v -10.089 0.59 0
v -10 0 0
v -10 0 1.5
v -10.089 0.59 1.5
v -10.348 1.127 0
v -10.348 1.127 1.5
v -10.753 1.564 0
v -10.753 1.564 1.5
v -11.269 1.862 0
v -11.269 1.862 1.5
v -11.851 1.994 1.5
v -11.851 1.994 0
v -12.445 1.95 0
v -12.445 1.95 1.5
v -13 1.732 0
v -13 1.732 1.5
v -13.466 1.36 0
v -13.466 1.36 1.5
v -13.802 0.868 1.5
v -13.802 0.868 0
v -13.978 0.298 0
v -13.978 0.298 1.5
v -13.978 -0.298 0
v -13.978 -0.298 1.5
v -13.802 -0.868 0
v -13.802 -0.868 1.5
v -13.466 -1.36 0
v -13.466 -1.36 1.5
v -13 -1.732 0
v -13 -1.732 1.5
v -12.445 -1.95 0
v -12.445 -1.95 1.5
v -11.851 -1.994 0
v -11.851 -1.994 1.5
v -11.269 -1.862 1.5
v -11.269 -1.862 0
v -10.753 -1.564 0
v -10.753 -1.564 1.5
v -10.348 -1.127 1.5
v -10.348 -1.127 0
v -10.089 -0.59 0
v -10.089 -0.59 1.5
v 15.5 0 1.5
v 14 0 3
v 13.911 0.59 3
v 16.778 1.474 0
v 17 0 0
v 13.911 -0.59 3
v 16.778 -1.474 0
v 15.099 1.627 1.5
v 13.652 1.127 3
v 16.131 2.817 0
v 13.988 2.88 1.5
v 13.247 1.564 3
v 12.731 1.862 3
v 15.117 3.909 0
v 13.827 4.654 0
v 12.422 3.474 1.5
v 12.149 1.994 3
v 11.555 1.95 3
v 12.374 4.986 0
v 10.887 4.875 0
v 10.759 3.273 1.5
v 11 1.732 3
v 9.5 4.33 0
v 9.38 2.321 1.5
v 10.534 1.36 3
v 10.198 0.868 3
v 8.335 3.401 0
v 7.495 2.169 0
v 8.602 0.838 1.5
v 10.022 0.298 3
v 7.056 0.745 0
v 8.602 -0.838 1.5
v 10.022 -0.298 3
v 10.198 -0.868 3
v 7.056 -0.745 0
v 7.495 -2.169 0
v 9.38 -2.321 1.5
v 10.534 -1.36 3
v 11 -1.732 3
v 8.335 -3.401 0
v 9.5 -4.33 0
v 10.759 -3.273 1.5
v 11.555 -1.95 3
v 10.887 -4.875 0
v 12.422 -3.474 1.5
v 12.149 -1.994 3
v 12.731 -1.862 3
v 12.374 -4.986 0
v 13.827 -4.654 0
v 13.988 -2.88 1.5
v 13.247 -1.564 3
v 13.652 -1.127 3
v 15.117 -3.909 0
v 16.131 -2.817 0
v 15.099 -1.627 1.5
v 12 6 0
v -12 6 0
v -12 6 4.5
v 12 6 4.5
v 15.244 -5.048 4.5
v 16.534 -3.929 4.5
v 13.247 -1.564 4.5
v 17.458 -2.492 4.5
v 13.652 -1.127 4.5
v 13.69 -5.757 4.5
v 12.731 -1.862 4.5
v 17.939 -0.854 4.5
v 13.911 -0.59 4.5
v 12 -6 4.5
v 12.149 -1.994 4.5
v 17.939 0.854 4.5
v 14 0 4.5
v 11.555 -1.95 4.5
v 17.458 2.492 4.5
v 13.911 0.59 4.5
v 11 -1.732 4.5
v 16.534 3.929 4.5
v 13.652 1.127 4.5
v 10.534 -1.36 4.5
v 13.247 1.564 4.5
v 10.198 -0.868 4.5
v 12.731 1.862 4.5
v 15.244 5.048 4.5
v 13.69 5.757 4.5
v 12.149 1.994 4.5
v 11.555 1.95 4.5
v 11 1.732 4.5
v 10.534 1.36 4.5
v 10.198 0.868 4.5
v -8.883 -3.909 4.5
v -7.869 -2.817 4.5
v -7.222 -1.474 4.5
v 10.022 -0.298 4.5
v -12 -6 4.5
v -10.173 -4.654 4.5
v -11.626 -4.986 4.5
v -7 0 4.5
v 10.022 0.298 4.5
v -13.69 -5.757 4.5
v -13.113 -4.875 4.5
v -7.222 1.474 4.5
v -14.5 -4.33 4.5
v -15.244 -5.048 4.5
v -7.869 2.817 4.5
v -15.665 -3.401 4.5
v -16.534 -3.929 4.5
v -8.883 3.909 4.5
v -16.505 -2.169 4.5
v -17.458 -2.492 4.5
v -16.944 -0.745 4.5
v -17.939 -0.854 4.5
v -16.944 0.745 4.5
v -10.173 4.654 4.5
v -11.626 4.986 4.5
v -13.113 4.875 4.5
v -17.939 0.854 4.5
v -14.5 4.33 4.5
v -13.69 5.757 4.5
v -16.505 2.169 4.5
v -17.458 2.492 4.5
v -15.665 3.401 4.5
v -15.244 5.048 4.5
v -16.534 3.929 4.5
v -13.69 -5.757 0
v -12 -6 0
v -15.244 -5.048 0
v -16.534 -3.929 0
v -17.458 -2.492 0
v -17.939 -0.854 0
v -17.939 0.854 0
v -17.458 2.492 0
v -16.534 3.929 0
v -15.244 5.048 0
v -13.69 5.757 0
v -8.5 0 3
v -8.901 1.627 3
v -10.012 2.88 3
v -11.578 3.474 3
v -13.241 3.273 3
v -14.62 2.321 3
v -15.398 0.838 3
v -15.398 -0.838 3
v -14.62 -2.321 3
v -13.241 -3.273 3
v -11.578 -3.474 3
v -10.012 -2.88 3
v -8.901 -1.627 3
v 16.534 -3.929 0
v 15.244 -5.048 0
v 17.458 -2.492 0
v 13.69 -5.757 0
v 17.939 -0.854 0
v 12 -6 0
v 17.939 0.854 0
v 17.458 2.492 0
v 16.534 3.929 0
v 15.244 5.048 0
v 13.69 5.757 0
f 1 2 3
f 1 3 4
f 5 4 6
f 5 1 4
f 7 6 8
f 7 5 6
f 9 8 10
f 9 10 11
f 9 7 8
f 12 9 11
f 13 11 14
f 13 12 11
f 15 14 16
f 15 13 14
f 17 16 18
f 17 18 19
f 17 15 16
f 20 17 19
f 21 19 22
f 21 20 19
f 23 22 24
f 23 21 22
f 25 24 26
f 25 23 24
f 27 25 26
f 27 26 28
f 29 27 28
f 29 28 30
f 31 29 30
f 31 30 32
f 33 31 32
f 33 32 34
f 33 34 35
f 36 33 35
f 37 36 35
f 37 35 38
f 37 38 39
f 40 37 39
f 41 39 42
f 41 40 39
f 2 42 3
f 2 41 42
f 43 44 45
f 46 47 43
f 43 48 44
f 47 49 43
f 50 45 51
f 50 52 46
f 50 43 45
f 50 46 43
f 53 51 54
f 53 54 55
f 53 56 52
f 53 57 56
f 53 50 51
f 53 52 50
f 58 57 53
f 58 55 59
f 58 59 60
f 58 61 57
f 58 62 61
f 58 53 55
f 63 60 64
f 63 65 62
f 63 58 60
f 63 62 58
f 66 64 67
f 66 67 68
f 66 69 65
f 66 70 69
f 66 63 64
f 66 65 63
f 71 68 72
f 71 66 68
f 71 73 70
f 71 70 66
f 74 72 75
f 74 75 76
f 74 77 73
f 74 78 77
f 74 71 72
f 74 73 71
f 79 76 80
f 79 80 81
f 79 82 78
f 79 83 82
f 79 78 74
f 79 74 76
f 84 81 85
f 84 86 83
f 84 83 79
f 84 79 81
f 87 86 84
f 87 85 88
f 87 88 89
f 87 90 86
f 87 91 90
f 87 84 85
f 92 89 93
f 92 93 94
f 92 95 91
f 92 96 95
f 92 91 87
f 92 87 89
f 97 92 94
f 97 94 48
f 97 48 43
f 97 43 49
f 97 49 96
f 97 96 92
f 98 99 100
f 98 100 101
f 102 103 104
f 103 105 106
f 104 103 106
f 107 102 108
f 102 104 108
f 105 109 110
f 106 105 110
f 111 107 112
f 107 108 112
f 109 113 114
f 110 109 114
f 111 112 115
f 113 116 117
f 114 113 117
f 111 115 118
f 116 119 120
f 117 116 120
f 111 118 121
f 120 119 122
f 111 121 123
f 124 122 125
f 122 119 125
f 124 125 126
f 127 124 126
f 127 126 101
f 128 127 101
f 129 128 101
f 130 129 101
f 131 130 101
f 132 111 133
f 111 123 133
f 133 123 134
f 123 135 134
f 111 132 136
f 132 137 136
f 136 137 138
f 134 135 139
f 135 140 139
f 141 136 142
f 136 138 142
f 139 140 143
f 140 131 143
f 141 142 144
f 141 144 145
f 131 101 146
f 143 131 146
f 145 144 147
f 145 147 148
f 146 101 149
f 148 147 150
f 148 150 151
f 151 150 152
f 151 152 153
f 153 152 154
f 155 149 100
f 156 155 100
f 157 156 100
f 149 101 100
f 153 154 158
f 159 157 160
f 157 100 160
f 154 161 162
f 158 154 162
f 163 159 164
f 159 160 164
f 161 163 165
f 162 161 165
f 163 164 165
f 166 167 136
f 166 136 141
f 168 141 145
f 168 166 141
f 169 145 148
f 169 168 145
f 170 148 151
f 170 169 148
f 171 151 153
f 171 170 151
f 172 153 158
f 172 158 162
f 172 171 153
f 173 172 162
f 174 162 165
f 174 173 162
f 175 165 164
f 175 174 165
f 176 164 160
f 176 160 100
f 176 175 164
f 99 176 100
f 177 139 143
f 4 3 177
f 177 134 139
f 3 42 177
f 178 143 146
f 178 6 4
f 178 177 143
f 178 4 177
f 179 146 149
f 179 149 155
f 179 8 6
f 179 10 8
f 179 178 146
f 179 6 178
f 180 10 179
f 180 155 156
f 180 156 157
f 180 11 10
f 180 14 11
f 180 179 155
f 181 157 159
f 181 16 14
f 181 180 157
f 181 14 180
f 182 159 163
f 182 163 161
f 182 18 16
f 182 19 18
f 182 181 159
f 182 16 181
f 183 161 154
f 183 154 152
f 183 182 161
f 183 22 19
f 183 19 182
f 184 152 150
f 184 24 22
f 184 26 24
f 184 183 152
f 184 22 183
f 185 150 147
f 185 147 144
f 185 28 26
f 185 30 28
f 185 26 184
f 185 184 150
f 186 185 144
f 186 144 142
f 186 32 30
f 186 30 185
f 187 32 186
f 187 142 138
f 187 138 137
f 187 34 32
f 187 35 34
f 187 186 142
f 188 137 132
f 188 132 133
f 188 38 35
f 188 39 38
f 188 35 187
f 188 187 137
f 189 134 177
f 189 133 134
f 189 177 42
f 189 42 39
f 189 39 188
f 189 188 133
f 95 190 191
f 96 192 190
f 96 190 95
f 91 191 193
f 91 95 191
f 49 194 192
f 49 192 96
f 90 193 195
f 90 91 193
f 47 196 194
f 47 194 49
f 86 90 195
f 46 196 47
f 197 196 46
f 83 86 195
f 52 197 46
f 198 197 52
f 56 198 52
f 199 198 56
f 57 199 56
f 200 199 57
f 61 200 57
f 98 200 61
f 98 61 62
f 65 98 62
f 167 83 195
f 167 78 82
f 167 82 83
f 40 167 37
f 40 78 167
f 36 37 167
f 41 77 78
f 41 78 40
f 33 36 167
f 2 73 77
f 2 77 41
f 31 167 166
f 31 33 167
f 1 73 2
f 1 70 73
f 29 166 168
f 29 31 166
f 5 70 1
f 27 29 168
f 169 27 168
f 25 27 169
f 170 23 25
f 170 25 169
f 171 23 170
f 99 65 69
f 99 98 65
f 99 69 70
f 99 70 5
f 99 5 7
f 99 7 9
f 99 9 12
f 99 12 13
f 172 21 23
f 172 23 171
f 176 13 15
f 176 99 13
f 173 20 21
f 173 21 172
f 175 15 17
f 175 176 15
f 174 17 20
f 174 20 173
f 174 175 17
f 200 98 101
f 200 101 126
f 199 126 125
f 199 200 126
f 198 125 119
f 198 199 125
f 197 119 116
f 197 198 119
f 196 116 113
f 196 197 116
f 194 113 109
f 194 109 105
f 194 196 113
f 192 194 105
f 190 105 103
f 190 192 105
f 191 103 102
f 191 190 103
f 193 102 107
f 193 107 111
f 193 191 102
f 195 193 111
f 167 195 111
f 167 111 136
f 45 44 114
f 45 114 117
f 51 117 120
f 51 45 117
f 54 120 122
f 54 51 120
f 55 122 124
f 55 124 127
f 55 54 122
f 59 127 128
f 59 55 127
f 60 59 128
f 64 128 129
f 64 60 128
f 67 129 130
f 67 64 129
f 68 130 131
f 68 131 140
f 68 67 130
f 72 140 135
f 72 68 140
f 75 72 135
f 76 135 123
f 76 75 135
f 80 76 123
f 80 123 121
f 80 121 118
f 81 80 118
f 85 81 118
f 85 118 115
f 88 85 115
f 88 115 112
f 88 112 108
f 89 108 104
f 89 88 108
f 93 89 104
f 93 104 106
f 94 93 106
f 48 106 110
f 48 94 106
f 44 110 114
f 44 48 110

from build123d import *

# Parameters (mm, degrees)
SKETCH1_R           = 2
BOSS_EXTRUDE1_DEPTH = 4.5
CHAMFER1_SIZE       = 3
CHAMFER2_SIZE       = 3


with BuildPart() as part:
    # Sketch1 → Boss-Extrude1 (new body)
    with BuildSketch(Plane.XY):
        with BuildLine():
            Line((-12, 6), (12, 6))
            ThreePointArc((12, 6), (18, 0), (12, -6))
            Line((12, -6), (-12, -6))
            ThreePointArc((-12, -6), (-18, 0), (-12, 6))
        make_face()
        with Locations((-12, 0)):
            Circle(SKETCH1_R, mode=Mode.SUBTRACT)
        with Locations((12, 0)):
            Circle(SKETCH1_R, mode=Mode.SUBTRACT)
    extrude(amount=BOSS_EXTRUDE1_DEPTH)

    # Chamfer1
    chamfer1_edges = [part.edges().sort_by_distance(p)[0] for p in [
        (10, 0, 0),
    ]]
    chamfer(chamfer1_edges, length=CHAMFER1_SIZE)

    # Chamfer2
    chamfer2_edges = [part.edges().sort_by_distance(p)[0] for p in [
        (-14, 0, 4.5),
    ]]
    chamfer(chamfer2_edges, length=CHAMFER2_SIZE)


solid = part.part
